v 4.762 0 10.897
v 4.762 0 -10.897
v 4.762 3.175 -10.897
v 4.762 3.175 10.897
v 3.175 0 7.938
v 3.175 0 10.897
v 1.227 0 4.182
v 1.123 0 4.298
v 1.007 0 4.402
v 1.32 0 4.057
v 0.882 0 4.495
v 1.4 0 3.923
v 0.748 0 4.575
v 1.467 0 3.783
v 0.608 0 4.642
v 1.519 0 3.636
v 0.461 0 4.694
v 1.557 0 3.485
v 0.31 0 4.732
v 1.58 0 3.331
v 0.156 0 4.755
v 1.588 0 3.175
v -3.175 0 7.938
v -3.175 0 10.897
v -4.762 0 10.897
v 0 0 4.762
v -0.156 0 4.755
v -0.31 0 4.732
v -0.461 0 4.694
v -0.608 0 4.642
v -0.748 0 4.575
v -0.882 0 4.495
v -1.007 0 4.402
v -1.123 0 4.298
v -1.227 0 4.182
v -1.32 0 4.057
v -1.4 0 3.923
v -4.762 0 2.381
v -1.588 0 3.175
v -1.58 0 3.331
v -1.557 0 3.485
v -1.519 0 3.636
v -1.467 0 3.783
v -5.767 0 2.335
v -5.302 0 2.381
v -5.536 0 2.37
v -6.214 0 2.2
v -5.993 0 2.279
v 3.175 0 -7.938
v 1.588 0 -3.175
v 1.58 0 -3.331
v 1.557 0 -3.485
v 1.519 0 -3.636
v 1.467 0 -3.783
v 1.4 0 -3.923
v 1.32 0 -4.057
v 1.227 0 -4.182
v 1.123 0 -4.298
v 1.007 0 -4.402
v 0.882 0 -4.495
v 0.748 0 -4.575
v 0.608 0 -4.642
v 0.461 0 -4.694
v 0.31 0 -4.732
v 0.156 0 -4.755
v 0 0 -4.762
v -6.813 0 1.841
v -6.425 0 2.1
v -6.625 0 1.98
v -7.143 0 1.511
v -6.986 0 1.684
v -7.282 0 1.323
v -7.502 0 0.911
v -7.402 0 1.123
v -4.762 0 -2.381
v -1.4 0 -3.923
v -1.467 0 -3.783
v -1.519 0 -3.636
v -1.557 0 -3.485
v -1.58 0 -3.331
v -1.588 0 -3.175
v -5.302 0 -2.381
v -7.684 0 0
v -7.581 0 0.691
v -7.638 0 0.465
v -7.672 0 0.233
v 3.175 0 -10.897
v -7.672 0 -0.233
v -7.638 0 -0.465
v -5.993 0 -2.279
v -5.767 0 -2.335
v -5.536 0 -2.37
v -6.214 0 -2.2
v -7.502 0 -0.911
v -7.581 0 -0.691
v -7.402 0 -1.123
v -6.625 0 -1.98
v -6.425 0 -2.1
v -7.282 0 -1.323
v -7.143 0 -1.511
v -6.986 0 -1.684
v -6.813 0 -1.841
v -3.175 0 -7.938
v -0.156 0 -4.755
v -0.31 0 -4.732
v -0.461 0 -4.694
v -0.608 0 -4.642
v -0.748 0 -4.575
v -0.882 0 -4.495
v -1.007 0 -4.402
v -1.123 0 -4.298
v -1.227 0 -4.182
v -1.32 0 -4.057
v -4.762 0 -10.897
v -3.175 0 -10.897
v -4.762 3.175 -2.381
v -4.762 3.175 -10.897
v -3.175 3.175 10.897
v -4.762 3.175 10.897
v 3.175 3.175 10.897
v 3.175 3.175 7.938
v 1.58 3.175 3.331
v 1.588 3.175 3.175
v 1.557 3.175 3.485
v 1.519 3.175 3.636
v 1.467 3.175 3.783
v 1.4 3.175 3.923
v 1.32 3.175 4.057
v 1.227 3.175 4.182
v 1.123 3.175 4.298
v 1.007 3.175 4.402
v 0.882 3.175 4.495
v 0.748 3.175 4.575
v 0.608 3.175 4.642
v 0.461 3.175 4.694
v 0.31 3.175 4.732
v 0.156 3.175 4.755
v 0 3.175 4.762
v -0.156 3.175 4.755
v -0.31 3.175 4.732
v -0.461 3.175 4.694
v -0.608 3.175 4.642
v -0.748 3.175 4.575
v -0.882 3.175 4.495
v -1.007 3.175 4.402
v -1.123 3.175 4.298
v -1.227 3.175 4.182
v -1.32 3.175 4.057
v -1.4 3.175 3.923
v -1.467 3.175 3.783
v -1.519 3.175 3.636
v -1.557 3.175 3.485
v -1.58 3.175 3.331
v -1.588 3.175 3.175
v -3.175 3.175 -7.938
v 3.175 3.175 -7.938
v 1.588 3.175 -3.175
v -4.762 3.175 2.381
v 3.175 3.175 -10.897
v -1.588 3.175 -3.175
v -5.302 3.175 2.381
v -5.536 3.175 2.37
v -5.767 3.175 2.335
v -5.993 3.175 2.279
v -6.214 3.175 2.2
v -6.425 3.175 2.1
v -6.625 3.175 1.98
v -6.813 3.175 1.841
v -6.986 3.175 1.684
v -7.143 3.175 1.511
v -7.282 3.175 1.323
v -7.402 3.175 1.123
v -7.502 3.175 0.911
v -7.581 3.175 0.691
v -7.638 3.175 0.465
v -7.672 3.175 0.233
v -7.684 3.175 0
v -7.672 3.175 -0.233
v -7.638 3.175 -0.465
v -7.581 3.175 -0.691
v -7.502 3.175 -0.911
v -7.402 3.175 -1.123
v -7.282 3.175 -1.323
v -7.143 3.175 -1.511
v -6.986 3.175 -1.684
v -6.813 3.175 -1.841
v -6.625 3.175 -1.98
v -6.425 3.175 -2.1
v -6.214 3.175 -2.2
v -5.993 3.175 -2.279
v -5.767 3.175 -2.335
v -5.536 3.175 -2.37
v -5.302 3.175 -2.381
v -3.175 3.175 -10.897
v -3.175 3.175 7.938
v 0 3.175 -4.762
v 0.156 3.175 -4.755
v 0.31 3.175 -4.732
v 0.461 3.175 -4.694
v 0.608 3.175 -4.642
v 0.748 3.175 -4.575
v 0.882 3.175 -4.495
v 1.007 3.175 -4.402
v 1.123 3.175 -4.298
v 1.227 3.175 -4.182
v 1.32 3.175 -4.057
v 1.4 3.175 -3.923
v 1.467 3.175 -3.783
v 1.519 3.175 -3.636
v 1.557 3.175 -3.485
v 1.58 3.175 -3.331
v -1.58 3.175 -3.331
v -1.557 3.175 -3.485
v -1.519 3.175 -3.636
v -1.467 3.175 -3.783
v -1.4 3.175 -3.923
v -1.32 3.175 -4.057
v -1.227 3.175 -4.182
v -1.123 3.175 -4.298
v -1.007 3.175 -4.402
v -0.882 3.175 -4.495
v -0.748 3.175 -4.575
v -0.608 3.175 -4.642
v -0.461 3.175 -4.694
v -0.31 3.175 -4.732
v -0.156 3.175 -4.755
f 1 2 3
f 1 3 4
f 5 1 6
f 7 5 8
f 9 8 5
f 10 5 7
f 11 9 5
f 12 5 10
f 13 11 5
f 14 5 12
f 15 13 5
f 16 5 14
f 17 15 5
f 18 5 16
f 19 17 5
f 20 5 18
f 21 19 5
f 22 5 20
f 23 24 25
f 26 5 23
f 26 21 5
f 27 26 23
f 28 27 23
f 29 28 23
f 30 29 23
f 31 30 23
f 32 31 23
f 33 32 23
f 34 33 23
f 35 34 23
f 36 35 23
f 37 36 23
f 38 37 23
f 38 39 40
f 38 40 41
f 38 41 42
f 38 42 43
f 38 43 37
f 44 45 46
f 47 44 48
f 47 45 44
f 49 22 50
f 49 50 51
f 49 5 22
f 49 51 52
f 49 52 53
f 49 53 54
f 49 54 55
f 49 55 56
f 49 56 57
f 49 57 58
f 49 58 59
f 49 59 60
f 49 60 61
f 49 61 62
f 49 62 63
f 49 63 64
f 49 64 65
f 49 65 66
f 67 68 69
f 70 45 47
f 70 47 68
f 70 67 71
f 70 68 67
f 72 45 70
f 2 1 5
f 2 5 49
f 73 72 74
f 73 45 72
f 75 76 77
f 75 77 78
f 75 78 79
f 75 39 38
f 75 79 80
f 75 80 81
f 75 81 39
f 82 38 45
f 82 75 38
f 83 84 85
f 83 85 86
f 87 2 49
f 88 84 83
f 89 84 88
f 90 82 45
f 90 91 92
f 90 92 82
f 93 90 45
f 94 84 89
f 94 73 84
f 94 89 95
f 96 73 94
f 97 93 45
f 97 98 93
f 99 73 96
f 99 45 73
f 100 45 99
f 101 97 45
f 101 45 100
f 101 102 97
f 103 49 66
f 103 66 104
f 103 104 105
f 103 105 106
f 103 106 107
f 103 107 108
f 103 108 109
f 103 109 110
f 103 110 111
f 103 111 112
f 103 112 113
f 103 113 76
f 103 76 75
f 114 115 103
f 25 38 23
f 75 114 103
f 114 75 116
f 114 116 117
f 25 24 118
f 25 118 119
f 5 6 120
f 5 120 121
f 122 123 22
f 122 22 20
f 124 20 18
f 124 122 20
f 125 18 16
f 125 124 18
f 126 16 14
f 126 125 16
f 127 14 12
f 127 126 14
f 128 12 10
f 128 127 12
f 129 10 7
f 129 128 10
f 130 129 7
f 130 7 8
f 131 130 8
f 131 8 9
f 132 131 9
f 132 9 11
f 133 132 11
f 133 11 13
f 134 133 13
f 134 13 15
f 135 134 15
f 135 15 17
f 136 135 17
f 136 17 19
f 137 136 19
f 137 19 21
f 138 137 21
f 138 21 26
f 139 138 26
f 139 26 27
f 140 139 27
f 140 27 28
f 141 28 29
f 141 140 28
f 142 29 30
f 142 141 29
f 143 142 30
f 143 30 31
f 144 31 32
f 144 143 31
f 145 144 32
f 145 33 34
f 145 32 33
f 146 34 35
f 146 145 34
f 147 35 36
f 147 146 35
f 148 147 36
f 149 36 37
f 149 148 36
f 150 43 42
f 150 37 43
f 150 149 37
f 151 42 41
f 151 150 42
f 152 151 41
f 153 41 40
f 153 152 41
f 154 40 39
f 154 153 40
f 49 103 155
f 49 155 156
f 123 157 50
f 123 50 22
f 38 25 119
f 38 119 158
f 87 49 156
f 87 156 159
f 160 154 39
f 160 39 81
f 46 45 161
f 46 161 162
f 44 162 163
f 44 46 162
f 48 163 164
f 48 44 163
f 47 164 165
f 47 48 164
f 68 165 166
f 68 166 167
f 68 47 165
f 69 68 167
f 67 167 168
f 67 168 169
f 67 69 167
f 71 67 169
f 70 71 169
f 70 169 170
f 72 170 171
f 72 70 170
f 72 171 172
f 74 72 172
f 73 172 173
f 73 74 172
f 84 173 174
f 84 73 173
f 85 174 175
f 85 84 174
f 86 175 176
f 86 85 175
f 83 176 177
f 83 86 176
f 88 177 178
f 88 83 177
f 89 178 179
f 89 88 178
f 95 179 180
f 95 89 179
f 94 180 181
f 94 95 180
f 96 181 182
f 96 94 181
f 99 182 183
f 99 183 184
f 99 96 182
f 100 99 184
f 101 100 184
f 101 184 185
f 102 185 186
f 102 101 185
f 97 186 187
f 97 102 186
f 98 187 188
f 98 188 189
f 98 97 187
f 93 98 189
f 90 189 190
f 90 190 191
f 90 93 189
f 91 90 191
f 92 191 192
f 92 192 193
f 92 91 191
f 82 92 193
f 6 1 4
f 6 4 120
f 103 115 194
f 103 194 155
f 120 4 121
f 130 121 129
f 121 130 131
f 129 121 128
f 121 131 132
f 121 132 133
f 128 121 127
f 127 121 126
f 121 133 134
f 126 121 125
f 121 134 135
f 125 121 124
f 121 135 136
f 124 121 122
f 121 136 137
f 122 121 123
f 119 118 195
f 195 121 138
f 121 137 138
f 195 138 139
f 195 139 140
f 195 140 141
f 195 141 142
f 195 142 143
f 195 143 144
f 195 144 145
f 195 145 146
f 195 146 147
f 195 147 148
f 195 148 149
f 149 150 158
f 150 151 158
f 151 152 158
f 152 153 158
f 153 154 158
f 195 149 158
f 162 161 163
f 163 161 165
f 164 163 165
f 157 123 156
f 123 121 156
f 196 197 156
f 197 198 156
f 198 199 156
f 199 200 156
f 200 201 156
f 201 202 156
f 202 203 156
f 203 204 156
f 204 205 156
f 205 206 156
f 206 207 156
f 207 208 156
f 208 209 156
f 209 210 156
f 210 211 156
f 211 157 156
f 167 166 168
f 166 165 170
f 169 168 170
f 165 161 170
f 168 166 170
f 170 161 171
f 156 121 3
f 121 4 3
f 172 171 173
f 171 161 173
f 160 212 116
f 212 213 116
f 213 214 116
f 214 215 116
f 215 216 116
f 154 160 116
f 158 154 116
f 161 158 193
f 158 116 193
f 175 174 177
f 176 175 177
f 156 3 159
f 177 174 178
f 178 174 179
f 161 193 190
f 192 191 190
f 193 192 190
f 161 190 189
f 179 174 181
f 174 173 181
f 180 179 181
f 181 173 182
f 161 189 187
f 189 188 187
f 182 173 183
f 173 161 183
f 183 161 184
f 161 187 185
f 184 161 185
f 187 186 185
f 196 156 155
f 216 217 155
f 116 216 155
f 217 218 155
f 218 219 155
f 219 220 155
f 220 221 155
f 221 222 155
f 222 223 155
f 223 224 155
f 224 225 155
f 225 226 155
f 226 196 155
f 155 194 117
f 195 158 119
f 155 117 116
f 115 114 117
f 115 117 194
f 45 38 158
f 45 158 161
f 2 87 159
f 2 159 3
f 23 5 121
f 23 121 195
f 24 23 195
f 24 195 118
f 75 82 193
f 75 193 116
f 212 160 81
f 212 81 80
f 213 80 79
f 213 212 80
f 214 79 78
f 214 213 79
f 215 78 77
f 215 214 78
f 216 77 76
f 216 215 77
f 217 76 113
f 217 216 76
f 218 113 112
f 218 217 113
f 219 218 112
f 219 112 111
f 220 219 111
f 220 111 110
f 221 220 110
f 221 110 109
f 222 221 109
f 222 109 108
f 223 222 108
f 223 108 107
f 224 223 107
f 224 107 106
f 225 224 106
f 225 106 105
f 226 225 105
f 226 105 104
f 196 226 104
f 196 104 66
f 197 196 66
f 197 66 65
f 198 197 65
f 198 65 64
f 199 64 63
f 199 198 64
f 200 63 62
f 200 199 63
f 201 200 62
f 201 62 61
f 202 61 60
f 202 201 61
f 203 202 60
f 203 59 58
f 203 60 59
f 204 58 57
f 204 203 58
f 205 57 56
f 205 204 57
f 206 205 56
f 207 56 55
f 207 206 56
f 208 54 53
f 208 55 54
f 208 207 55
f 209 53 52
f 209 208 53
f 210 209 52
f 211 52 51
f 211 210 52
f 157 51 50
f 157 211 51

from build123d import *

# Parameters (mm, degrees)
BOSS_EXTRUDE1_DEPTH = 3.175
CUT_EXTRUDE1_REACH  = 5.175


with BuildPart() as part:
    # Sketch2 → Boss-Extrude1 (new body)
    with BuildSketch(Plane(origin=(0, 0, 0), x_dir=(1, 0, 0), z_dir=(0, 1, 0))):
        with BuildLine():
            Line((-3.175, 10.8966), (-3.175, 7.9375))
            Line((-3.175, 7.9375), (3.175, 7.9375))
            Line((3.175, 7.9375), (3.175, 10.8966))
            Line((3.175, 10.8966), (4.7625, 10.8966))
            Line((4.7625, 10.8966), (4.7625, -10.8966))
            Line((4.7625, -10.8966), (3.175, -10.8966))
            Line((3.175, -10.8966), (3.175, -7.9375))
            Line((3.175, -7.9375), (-3.175, -7.9375))
            Line((-3.175, -7.9375), (-3.175, -10.8966))
            Line((-3.175, -10.8966), (-4.7625, -10.8966))
            Line((-4.7625, -10.8966), (-4.7625, -2.38125))
            Line((-4.7625, -2.38125), (-5.30225, -2.38125))
            ThreePointArc((-5.30225, -2.38125), (-7.6835, 0), (-5.30225, 2.38125))
            Line((-5.30225, 2.38125), (-4.7625, 2.38125))
            Line((-4.7625, 2.38125), (-4.7625, 10.8966))
            Line((-4.7625, 10.8966), (-3.175, 10.8966))
        make_face()
    extrude(amount=BOSS_EXTRUDE1_DEPTH)

    # Sketch3 → Cut-Extrude1 (cut, up to next)
    with BuildSketch(Plane(origin=(0, 3.175, 0), x_dir=(1, 0, 0), z_dir=(0, 1, 0)), mode=Mode.PRIVATE) as cut_extrude1_sk1:
        with BuildLine():
            Line((1.5875, 3.175), (1.5875, -3.175))
            ThreePointArc((1.5875, -3.175), (0, -4.7625), (-1.5875, -3.175))
            Line((-1.5875, -3.175), (-1.5875, 3.175))
            ThreePointArc((-1.5875, 3.175), (0, 4.7625), (1.5875, 3.175))
        make_face()
    cut_extrude1_tool1 = extrude(cut_extrude1_sk1.sketch, amount=-CUT_EXTRUDE1_REACH, mode=Mode.PRIVATE) & part.part
    add(cut_extrude1_tool1.solids().sort_by_distance((0, 3.175, 0))[0], mode=Mode.SUBTRACT)


solid = part.part
